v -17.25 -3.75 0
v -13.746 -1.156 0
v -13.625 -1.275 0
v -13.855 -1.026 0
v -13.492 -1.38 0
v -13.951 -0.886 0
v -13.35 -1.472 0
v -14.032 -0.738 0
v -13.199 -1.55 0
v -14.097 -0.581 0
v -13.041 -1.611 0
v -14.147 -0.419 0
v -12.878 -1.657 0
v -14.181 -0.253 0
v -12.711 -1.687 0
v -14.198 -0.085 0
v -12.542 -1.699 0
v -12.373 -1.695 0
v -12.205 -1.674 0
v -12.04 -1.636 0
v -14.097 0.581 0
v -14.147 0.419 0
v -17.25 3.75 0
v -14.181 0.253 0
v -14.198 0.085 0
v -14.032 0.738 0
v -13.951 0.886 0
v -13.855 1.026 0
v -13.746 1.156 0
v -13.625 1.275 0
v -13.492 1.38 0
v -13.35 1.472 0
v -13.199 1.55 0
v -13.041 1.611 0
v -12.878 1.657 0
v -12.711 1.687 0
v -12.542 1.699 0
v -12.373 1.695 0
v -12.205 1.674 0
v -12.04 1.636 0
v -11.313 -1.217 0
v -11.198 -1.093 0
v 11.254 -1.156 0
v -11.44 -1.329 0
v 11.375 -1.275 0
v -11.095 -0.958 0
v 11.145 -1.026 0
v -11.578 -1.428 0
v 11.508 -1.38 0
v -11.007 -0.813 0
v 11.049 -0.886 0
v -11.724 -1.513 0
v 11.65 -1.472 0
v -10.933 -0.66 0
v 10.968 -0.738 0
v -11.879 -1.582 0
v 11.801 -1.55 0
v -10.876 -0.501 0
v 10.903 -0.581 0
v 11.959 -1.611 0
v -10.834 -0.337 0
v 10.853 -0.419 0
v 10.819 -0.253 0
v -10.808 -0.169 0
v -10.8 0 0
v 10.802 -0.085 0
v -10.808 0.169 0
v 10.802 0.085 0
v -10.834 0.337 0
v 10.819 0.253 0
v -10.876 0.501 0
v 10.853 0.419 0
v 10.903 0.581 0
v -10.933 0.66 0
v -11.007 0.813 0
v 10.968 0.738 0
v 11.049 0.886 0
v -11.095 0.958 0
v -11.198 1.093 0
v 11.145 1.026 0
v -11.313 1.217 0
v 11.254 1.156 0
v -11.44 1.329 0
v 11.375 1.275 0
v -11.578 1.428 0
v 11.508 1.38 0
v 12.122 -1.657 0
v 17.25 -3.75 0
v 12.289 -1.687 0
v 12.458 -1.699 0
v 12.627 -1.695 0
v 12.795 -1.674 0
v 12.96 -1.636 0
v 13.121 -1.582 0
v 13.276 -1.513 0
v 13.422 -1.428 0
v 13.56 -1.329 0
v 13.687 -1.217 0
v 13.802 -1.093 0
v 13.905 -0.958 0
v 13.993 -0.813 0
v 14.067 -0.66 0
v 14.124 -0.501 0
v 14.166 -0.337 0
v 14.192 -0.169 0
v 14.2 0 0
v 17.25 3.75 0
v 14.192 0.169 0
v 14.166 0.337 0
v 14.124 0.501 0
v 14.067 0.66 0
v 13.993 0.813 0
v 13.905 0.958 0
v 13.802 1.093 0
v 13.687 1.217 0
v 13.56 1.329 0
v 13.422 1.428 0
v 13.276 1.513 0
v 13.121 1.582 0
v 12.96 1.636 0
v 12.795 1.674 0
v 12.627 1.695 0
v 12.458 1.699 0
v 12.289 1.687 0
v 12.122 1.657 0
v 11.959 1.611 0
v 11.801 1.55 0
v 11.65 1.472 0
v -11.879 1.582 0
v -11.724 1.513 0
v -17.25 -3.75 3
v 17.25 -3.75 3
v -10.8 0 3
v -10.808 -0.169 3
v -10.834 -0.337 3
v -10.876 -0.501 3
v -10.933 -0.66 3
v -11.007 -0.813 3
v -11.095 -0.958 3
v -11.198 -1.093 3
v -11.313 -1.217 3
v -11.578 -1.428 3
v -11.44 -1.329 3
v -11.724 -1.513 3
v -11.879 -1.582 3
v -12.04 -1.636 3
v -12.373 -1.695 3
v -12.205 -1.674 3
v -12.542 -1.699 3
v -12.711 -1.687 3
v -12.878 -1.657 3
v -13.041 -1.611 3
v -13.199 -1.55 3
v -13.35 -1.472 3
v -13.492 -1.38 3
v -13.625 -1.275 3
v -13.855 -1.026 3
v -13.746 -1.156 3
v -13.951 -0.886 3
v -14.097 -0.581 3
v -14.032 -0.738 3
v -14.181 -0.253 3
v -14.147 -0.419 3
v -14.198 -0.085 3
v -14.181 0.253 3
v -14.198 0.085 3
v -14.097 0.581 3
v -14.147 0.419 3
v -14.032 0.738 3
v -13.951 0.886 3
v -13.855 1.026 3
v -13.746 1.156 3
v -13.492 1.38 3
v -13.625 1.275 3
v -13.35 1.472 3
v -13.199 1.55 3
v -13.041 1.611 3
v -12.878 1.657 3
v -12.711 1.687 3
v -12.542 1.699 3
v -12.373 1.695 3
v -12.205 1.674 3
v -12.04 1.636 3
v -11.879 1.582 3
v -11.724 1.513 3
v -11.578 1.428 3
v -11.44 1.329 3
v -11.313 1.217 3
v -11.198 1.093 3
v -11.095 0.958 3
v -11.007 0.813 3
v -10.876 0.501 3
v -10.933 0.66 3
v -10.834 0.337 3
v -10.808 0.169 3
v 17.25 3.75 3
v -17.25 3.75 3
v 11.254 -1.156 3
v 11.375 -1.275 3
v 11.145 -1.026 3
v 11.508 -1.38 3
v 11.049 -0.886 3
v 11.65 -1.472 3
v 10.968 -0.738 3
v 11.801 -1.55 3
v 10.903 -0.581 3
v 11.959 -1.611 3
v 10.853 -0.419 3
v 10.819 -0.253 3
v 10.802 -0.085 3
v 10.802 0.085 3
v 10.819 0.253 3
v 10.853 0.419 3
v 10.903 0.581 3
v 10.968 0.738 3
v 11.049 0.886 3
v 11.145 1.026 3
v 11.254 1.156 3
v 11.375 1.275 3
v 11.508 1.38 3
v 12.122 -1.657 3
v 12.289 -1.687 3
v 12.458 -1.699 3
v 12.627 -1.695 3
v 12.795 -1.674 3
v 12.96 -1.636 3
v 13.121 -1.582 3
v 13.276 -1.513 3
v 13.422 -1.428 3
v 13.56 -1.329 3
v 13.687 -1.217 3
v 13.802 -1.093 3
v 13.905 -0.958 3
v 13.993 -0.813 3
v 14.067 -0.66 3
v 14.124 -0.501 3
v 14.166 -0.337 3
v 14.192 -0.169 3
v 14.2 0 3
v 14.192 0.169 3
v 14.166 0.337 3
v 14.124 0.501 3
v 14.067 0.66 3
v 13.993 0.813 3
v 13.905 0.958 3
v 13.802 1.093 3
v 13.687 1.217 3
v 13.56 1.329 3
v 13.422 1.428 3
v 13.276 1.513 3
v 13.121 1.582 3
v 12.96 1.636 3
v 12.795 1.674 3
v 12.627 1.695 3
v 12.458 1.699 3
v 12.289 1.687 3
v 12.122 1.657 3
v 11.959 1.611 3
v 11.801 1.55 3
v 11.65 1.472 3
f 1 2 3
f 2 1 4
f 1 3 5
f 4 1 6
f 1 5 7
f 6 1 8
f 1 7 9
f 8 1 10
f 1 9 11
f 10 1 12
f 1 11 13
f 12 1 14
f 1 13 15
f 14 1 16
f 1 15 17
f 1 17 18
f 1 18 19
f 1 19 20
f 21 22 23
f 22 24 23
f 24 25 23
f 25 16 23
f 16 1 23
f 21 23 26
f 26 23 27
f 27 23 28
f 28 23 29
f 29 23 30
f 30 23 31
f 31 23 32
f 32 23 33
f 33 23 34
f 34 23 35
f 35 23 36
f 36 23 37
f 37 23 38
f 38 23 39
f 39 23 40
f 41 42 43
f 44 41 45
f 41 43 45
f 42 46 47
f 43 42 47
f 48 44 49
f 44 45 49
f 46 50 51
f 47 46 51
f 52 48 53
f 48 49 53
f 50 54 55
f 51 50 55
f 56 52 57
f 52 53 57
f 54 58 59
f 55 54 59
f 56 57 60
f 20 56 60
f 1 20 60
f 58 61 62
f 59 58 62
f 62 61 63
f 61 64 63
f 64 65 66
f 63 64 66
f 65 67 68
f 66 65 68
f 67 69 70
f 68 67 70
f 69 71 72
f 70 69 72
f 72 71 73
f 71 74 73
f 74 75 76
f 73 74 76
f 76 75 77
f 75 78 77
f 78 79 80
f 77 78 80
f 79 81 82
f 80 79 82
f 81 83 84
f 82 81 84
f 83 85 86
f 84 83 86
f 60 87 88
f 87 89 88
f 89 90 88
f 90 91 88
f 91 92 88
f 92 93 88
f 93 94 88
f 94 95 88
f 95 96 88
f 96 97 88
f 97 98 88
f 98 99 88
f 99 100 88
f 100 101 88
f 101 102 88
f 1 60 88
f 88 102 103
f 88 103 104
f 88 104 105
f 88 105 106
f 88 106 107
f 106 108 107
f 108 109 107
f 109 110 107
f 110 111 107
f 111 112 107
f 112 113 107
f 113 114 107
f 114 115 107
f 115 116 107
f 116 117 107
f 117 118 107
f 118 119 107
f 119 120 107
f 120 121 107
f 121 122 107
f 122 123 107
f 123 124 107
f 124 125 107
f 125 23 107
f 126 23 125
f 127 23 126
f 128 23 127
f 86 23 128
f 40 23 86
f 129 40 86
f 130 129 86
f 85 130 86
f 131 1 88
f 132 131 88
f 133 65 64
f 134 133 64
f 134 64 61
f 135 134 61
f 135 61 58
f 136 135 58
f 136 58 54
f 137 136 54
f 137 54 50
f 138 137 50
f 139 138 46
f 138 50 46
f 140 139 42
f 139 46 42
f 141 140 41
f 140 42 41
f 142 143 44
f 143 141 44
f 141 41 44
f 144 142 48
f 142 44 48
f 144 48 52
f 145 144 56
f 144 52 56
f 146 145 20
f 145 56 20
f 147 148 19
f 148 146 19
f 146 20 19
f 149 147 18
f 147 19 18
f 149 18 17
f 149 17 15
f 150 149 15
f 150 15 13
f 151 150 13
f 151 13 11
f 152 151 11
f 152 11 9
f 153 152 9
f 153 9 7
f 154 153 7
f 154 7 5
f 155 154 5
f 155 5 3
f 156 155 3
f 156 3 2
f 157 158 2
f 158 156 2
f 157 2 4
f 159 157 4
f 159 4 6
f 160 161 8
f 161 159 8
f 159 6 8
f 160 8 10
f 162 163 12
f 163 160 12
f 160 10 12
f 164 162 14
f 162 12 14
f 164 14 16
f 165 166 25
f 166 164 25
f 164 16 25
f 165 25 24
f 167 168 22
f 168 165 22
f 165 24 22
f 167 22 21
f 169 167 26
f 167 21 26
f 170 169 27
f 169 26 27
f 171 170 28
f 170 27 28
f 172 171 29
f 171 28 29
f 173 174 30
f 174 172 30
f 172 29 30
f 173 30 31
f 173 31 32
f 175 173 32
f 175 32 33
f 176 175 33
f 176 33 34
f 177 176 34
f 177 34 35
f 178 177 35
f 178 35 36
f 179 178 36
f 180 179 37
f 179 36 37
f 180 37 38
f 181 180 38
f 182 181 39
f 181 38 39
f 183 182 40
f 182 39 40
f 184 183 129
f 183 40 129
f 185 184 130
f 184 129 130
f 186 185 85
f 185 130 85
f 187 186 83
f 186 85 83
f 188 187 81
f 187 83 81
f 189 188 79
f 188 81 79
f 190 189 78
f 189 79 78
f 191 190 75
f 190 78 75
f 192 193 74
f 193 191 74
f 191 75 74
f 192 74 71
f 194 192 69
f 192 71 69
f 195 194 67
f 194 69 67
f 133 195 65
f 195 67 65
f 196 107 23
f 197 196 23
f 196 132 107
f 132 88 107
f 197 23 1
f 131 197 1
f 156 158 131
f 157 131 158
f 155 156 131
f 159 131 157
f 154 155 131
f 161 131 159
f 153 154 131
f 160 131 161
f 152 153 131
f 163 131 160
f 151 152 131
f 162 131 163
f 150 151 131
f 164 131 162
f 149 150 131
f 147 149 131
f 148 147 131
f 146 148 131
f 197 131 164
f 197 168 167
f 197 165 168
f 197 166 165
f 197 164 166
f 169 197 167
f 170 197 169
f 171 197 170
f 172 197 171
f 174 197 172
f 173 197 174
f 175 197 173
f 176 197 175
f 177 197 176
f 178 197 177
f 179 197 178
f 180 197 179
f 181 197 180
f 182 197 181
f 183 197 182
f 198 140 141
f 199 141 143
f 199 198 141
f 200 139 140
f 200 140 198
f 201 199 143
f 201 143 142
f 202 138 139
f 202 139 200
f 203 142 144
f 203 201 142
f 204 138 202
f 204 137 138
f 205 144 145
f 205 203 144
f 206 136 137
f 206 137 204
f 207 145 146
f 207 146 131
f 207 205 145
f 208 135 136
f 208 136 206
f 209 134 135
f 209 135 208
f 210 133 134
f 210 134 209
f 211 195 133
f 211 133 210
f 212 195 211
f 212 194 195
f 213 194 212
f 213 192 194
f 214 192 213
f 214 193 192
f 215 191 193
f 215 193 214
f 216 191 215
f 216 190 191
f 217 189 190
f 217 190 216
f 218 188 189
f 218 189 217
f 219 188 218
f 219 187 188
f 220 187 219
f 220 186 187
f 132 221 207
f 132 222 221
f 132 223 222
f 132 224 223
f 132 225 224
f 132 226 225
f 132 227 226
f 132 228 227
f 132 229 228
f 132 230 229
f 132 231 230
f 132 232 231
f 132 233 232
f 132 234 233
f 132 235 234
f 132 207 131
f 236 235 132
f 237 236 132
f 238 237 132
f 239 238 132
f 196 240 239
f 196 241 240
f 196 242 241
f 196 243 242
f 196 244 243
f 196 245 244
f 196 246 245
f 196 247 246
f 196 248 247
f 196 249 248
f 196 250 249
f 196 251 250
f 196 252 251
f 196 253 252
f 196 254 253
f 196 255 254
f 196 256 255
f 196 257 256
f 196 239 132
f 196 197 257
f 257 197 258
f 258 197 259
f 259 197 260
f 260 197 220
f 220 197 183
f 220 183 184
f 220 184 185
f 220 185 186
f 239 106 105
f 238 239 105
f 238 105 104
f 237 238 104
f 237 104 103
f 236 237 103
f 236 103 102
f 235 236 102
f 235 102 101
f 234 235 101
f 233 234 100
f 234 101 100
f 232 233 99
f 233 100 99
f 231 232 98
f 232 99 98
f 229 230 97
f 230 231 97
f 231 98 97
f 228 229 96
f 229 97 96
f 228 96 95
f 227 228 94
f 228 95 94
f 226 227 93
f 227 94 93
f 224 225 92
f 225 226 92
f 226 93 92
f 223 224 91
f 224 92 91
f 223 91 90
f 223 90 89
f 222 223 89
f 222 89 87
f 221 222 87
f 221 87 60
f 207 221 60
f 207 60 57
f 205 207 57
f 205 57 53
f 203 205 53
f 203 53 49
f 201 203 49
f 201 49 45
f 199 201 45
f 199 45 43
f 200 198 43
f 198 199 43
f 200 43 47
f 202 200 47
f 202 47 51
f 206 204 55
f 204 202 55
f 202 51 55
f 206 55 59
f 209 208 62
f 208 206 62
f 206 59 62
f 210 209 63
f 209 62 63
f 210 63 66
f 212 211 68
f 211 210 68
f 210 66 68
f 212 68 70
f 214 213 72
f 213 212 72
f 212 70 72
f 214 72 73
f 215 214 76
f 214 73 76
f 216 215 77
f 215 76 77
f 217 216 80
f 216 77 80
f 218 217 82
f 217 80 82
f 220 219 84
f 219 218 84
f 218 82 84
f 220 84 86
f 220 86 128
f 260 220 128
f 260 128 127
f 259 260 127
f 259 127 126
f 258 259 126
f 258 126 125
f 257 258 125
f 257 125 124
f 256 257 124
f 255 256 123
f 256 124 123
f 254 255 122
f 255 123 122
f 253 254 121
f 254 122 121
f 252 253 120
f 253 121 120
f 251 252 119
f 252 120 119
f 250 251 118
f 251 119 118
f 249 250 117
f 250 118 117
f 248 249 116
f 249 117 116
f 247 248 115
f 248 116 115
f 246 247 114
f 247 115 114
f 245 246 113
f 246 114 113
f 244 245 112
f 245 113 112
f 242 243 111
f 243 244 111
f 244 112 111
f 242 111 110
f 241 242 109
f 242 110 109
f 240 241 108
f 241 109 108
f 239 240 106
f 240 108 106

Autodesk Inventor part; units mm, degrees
ref_plane "YZ Plane" through (0, 0, 0) normal (1, 0, 0) x (0, 1, 0)
ref_plane "XZ Plane" through (0, 0, 0) normal (0, 1, 0) x (-1, 0, 0)
ref_plane "XY Plane" through (0, 0, 0) normal (0, 0, 1) x (1, 0, 0)
sketch "Skizze1" plane through (0, 0, 0) normal (0, 0, 1) x (1, 0, 0)
  line L0 (-17.25, -3.75) -> (17.25, -3.75)
  line L1 (17.25, -3.75) -> (17.25, 3.75)
  line L2 (17.25, 3.75) -> (-17.25, 3.75)
  line L3 (-17.25, 3.75) -> (-17.25, -3.75)
  line L4 (-17.25, -3.75) -> (17.25, 3.75) construction
  line L5 (17.25, -3.75) -> (-17.25, 3.75) construction
  circle A0 centre (-12.5, 0) radius 1.7
  circle A1 centre (12.5, 0) radius 1.7
  line L6 (-17.25, 0) -> (17.25, 0) construction
  line L7 (0, -5.25) -> (0, 5.25) construction
  point P0 (0, 0)
  dimension "d0" = 7.5
  dimension "d1" = 34.5
  dimension "d2" = 3.4
  dimension "d3" = 25
extrude "Extrusion1" add sketch "Skizze1" along normal blind 3
properties part number "BMP280_Cableclamp"
